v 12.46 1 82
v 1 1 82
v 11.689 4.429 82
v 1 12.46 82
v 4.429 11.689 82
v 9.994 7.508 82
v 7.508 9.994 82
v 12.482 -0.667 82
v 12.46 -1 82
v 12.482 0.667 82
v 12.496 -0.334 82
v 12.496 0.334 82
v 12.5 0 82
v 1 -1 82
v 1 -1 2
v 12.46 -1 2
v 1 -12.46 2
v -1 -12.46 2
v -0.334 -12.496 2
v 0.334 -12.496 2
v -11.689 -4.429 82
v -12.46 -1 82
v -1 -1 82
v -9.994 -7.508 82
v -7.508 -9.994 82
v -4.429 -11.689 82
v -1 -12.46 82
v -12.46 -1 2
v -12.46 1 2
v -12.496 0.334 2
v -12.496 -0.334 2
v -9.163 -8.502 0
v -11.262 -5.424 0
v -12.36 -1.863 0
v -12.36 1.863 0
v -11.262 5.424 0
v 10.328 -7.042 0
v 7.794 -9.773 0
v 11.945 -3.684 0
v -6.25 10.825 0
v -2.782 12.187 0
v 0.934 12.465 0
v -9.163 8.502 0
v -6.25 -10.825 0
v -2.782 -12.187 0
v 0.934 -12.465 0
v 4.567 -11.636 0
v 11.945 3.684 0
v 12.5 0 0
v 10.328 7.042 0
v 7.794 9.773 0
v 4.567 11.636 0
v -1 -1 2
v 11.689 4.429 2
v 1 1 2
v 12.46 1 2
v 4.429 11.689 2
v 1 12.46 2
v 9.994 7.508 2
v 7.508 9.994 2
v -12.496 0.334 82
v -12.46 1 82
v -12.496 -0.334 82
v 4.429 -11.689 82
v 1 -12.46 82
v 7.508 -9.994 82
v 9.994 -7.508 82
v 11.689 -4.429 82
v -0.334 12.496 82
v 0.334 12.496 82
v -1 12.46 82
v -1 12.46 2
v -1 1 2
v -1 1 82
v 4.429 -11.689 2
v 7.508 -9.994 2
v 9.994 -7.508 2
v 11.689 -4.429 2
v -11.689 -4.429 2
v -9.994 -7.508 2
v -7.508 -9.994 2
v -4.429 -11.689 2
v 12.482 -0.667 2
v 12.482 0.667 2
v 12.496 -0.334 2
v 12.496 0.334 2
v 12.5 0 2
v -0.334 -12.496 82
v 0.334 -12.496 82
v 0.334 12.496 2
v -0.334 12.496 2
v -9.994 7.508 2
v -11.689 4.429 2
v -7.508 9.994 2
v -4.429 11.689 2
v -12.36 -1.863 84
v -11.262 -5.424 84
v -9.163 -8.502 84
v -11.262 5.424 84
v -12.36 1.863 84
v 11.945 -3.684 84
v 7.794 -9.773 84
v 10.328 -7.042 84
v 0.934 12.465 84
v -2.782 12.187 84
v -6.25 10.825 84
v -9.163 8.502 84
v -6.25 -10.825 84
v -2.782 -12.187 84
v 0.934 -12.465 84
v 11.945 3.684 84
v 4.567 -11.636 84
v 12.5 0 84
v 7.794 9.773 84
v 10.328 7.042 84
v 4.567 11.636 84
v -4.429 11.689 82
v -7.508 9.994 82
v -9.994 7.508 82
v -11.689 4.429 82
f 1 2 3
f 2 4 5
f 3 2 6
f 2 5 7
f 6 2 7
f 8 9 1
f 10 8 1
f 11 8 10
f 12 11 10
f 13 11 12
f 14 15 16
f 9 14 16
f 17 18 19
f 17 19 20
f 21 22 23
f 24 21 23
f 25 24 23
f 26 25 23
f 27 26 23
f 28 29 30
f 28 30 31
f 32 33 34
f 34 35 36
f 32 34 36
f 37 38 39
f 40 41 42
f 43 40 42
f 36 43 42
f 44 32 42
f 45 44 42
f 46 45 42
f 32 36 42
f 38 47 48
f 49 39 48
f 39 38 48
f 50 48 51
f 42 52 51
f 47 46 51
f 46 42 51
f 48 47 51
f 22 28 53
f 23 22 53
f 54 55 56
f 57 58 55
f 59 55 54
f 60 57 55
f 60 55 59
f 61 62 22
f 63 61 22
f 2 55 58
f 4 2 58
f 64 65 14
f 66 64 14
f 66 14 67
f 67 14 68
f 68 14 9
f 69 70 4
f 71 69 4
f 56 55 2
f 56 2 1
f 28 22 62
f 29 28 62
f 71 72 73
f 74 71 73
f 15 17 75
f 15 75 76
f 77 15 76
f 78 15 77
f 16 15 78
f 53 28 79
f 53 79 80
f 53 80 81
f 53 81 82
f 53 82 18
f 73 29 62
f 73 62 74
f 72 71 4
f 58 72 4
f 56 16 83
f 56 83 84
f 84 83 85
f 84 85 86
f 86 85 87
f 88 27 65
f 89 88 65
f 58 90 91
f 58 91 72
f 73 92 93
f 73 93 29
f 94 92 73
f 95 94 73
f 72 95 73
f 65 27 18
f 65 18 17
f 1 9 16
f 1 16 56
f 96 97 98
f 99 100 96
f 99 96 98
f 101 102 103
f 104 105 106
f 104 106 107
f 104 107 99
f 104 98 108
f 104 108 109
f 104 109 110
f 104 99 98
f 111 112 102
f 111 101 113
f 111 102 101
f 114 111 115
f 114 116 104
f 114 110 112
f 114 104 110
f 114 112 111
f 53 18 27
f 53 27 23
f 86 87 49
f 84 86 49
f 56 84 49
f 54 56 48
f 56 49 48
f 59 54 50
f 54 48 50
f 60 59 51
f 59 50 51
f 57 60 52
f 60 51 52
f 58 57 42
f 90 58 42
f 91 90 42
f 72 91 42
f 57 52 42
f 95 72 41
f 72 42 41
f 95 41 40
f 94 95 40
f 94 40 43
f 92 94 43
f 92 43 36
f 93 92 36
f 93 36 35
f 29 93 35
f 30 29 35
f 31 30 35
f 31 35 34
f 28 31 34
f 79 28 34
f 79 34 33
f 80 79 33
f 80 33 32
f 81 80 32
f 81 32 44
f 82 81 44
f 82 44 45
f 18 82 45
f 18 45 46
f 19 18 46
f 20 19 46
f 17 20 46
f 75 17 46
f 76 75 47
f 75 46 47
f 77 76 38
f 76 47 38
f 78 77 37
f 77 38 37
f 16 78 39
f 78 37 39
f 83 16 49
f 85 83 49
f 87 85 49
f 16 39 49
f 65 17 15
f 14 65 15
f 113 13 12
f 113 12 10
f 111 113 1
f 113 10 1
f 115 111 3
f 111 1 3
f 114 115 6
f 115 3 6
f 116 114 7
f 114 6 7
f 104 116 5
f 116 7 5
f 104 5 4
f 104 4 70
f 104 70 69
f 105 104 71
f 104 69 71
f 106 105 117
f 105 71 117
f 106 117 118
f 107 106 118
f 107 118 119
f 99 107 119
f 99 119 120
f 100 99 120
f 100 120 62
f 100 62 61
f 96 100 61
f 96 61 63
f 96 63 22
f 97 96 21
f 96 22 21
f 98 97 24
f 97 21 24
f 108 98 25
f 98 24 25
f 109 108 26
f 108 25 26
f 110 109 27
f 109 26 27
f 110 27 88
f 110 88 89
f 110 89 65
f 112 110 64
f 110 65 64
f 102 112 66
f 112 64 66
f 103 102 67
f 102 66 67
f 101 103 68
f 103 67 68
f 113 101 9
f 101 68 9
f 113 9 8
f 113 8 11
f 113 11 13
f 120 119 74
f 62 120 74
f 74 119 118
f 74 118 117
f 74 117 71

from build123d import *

# Parameters (mm, degrees)
F0_R     = 12.5
F1_DEPTH = 2
F2_W     = 2
F2_H     = 11.4599357944
F2_H_2   = 2
F2_W_2   = 11.4599357944
F3_DEPTH = 80
F4_R     = 12.5
F5_DEPTH = 2


with BuildPart() as f1:
    # F0 (on Top) → F1 (new body)
    with BuildSketch(Plane.XY):
        Circle(F0_R)
    extrude(amount=F1_DEPTH)

    # F2 (on face) → F3 (join)
    with BuildSketch(Plane.XY.offset(2)):
        with Locations((0, 6.7299678972)):
            Rectangle(F2_W, F2_H)
        Rectangle(F2_W, F2_H_2)
        with Locations((-6.7299678972, 0)):
            Rectangle(F2_W_2, F2_H_2)
        with Locations((6.7299678972, 0)):
            Rectangle(F2_W_2, F2_H_2)
        with Locations((0, -6.7299678972)):
            Rectangle(F2_W, F2_H)
    extrude(amount=F3_DEPTH)

    # F4 (on face) → F5 (join)
    with BuildSketch(Plane.XY.offset(82)):
        Circle(F4_R)
    extrude(amount=F5_DEPTH)


solid = f1.part
